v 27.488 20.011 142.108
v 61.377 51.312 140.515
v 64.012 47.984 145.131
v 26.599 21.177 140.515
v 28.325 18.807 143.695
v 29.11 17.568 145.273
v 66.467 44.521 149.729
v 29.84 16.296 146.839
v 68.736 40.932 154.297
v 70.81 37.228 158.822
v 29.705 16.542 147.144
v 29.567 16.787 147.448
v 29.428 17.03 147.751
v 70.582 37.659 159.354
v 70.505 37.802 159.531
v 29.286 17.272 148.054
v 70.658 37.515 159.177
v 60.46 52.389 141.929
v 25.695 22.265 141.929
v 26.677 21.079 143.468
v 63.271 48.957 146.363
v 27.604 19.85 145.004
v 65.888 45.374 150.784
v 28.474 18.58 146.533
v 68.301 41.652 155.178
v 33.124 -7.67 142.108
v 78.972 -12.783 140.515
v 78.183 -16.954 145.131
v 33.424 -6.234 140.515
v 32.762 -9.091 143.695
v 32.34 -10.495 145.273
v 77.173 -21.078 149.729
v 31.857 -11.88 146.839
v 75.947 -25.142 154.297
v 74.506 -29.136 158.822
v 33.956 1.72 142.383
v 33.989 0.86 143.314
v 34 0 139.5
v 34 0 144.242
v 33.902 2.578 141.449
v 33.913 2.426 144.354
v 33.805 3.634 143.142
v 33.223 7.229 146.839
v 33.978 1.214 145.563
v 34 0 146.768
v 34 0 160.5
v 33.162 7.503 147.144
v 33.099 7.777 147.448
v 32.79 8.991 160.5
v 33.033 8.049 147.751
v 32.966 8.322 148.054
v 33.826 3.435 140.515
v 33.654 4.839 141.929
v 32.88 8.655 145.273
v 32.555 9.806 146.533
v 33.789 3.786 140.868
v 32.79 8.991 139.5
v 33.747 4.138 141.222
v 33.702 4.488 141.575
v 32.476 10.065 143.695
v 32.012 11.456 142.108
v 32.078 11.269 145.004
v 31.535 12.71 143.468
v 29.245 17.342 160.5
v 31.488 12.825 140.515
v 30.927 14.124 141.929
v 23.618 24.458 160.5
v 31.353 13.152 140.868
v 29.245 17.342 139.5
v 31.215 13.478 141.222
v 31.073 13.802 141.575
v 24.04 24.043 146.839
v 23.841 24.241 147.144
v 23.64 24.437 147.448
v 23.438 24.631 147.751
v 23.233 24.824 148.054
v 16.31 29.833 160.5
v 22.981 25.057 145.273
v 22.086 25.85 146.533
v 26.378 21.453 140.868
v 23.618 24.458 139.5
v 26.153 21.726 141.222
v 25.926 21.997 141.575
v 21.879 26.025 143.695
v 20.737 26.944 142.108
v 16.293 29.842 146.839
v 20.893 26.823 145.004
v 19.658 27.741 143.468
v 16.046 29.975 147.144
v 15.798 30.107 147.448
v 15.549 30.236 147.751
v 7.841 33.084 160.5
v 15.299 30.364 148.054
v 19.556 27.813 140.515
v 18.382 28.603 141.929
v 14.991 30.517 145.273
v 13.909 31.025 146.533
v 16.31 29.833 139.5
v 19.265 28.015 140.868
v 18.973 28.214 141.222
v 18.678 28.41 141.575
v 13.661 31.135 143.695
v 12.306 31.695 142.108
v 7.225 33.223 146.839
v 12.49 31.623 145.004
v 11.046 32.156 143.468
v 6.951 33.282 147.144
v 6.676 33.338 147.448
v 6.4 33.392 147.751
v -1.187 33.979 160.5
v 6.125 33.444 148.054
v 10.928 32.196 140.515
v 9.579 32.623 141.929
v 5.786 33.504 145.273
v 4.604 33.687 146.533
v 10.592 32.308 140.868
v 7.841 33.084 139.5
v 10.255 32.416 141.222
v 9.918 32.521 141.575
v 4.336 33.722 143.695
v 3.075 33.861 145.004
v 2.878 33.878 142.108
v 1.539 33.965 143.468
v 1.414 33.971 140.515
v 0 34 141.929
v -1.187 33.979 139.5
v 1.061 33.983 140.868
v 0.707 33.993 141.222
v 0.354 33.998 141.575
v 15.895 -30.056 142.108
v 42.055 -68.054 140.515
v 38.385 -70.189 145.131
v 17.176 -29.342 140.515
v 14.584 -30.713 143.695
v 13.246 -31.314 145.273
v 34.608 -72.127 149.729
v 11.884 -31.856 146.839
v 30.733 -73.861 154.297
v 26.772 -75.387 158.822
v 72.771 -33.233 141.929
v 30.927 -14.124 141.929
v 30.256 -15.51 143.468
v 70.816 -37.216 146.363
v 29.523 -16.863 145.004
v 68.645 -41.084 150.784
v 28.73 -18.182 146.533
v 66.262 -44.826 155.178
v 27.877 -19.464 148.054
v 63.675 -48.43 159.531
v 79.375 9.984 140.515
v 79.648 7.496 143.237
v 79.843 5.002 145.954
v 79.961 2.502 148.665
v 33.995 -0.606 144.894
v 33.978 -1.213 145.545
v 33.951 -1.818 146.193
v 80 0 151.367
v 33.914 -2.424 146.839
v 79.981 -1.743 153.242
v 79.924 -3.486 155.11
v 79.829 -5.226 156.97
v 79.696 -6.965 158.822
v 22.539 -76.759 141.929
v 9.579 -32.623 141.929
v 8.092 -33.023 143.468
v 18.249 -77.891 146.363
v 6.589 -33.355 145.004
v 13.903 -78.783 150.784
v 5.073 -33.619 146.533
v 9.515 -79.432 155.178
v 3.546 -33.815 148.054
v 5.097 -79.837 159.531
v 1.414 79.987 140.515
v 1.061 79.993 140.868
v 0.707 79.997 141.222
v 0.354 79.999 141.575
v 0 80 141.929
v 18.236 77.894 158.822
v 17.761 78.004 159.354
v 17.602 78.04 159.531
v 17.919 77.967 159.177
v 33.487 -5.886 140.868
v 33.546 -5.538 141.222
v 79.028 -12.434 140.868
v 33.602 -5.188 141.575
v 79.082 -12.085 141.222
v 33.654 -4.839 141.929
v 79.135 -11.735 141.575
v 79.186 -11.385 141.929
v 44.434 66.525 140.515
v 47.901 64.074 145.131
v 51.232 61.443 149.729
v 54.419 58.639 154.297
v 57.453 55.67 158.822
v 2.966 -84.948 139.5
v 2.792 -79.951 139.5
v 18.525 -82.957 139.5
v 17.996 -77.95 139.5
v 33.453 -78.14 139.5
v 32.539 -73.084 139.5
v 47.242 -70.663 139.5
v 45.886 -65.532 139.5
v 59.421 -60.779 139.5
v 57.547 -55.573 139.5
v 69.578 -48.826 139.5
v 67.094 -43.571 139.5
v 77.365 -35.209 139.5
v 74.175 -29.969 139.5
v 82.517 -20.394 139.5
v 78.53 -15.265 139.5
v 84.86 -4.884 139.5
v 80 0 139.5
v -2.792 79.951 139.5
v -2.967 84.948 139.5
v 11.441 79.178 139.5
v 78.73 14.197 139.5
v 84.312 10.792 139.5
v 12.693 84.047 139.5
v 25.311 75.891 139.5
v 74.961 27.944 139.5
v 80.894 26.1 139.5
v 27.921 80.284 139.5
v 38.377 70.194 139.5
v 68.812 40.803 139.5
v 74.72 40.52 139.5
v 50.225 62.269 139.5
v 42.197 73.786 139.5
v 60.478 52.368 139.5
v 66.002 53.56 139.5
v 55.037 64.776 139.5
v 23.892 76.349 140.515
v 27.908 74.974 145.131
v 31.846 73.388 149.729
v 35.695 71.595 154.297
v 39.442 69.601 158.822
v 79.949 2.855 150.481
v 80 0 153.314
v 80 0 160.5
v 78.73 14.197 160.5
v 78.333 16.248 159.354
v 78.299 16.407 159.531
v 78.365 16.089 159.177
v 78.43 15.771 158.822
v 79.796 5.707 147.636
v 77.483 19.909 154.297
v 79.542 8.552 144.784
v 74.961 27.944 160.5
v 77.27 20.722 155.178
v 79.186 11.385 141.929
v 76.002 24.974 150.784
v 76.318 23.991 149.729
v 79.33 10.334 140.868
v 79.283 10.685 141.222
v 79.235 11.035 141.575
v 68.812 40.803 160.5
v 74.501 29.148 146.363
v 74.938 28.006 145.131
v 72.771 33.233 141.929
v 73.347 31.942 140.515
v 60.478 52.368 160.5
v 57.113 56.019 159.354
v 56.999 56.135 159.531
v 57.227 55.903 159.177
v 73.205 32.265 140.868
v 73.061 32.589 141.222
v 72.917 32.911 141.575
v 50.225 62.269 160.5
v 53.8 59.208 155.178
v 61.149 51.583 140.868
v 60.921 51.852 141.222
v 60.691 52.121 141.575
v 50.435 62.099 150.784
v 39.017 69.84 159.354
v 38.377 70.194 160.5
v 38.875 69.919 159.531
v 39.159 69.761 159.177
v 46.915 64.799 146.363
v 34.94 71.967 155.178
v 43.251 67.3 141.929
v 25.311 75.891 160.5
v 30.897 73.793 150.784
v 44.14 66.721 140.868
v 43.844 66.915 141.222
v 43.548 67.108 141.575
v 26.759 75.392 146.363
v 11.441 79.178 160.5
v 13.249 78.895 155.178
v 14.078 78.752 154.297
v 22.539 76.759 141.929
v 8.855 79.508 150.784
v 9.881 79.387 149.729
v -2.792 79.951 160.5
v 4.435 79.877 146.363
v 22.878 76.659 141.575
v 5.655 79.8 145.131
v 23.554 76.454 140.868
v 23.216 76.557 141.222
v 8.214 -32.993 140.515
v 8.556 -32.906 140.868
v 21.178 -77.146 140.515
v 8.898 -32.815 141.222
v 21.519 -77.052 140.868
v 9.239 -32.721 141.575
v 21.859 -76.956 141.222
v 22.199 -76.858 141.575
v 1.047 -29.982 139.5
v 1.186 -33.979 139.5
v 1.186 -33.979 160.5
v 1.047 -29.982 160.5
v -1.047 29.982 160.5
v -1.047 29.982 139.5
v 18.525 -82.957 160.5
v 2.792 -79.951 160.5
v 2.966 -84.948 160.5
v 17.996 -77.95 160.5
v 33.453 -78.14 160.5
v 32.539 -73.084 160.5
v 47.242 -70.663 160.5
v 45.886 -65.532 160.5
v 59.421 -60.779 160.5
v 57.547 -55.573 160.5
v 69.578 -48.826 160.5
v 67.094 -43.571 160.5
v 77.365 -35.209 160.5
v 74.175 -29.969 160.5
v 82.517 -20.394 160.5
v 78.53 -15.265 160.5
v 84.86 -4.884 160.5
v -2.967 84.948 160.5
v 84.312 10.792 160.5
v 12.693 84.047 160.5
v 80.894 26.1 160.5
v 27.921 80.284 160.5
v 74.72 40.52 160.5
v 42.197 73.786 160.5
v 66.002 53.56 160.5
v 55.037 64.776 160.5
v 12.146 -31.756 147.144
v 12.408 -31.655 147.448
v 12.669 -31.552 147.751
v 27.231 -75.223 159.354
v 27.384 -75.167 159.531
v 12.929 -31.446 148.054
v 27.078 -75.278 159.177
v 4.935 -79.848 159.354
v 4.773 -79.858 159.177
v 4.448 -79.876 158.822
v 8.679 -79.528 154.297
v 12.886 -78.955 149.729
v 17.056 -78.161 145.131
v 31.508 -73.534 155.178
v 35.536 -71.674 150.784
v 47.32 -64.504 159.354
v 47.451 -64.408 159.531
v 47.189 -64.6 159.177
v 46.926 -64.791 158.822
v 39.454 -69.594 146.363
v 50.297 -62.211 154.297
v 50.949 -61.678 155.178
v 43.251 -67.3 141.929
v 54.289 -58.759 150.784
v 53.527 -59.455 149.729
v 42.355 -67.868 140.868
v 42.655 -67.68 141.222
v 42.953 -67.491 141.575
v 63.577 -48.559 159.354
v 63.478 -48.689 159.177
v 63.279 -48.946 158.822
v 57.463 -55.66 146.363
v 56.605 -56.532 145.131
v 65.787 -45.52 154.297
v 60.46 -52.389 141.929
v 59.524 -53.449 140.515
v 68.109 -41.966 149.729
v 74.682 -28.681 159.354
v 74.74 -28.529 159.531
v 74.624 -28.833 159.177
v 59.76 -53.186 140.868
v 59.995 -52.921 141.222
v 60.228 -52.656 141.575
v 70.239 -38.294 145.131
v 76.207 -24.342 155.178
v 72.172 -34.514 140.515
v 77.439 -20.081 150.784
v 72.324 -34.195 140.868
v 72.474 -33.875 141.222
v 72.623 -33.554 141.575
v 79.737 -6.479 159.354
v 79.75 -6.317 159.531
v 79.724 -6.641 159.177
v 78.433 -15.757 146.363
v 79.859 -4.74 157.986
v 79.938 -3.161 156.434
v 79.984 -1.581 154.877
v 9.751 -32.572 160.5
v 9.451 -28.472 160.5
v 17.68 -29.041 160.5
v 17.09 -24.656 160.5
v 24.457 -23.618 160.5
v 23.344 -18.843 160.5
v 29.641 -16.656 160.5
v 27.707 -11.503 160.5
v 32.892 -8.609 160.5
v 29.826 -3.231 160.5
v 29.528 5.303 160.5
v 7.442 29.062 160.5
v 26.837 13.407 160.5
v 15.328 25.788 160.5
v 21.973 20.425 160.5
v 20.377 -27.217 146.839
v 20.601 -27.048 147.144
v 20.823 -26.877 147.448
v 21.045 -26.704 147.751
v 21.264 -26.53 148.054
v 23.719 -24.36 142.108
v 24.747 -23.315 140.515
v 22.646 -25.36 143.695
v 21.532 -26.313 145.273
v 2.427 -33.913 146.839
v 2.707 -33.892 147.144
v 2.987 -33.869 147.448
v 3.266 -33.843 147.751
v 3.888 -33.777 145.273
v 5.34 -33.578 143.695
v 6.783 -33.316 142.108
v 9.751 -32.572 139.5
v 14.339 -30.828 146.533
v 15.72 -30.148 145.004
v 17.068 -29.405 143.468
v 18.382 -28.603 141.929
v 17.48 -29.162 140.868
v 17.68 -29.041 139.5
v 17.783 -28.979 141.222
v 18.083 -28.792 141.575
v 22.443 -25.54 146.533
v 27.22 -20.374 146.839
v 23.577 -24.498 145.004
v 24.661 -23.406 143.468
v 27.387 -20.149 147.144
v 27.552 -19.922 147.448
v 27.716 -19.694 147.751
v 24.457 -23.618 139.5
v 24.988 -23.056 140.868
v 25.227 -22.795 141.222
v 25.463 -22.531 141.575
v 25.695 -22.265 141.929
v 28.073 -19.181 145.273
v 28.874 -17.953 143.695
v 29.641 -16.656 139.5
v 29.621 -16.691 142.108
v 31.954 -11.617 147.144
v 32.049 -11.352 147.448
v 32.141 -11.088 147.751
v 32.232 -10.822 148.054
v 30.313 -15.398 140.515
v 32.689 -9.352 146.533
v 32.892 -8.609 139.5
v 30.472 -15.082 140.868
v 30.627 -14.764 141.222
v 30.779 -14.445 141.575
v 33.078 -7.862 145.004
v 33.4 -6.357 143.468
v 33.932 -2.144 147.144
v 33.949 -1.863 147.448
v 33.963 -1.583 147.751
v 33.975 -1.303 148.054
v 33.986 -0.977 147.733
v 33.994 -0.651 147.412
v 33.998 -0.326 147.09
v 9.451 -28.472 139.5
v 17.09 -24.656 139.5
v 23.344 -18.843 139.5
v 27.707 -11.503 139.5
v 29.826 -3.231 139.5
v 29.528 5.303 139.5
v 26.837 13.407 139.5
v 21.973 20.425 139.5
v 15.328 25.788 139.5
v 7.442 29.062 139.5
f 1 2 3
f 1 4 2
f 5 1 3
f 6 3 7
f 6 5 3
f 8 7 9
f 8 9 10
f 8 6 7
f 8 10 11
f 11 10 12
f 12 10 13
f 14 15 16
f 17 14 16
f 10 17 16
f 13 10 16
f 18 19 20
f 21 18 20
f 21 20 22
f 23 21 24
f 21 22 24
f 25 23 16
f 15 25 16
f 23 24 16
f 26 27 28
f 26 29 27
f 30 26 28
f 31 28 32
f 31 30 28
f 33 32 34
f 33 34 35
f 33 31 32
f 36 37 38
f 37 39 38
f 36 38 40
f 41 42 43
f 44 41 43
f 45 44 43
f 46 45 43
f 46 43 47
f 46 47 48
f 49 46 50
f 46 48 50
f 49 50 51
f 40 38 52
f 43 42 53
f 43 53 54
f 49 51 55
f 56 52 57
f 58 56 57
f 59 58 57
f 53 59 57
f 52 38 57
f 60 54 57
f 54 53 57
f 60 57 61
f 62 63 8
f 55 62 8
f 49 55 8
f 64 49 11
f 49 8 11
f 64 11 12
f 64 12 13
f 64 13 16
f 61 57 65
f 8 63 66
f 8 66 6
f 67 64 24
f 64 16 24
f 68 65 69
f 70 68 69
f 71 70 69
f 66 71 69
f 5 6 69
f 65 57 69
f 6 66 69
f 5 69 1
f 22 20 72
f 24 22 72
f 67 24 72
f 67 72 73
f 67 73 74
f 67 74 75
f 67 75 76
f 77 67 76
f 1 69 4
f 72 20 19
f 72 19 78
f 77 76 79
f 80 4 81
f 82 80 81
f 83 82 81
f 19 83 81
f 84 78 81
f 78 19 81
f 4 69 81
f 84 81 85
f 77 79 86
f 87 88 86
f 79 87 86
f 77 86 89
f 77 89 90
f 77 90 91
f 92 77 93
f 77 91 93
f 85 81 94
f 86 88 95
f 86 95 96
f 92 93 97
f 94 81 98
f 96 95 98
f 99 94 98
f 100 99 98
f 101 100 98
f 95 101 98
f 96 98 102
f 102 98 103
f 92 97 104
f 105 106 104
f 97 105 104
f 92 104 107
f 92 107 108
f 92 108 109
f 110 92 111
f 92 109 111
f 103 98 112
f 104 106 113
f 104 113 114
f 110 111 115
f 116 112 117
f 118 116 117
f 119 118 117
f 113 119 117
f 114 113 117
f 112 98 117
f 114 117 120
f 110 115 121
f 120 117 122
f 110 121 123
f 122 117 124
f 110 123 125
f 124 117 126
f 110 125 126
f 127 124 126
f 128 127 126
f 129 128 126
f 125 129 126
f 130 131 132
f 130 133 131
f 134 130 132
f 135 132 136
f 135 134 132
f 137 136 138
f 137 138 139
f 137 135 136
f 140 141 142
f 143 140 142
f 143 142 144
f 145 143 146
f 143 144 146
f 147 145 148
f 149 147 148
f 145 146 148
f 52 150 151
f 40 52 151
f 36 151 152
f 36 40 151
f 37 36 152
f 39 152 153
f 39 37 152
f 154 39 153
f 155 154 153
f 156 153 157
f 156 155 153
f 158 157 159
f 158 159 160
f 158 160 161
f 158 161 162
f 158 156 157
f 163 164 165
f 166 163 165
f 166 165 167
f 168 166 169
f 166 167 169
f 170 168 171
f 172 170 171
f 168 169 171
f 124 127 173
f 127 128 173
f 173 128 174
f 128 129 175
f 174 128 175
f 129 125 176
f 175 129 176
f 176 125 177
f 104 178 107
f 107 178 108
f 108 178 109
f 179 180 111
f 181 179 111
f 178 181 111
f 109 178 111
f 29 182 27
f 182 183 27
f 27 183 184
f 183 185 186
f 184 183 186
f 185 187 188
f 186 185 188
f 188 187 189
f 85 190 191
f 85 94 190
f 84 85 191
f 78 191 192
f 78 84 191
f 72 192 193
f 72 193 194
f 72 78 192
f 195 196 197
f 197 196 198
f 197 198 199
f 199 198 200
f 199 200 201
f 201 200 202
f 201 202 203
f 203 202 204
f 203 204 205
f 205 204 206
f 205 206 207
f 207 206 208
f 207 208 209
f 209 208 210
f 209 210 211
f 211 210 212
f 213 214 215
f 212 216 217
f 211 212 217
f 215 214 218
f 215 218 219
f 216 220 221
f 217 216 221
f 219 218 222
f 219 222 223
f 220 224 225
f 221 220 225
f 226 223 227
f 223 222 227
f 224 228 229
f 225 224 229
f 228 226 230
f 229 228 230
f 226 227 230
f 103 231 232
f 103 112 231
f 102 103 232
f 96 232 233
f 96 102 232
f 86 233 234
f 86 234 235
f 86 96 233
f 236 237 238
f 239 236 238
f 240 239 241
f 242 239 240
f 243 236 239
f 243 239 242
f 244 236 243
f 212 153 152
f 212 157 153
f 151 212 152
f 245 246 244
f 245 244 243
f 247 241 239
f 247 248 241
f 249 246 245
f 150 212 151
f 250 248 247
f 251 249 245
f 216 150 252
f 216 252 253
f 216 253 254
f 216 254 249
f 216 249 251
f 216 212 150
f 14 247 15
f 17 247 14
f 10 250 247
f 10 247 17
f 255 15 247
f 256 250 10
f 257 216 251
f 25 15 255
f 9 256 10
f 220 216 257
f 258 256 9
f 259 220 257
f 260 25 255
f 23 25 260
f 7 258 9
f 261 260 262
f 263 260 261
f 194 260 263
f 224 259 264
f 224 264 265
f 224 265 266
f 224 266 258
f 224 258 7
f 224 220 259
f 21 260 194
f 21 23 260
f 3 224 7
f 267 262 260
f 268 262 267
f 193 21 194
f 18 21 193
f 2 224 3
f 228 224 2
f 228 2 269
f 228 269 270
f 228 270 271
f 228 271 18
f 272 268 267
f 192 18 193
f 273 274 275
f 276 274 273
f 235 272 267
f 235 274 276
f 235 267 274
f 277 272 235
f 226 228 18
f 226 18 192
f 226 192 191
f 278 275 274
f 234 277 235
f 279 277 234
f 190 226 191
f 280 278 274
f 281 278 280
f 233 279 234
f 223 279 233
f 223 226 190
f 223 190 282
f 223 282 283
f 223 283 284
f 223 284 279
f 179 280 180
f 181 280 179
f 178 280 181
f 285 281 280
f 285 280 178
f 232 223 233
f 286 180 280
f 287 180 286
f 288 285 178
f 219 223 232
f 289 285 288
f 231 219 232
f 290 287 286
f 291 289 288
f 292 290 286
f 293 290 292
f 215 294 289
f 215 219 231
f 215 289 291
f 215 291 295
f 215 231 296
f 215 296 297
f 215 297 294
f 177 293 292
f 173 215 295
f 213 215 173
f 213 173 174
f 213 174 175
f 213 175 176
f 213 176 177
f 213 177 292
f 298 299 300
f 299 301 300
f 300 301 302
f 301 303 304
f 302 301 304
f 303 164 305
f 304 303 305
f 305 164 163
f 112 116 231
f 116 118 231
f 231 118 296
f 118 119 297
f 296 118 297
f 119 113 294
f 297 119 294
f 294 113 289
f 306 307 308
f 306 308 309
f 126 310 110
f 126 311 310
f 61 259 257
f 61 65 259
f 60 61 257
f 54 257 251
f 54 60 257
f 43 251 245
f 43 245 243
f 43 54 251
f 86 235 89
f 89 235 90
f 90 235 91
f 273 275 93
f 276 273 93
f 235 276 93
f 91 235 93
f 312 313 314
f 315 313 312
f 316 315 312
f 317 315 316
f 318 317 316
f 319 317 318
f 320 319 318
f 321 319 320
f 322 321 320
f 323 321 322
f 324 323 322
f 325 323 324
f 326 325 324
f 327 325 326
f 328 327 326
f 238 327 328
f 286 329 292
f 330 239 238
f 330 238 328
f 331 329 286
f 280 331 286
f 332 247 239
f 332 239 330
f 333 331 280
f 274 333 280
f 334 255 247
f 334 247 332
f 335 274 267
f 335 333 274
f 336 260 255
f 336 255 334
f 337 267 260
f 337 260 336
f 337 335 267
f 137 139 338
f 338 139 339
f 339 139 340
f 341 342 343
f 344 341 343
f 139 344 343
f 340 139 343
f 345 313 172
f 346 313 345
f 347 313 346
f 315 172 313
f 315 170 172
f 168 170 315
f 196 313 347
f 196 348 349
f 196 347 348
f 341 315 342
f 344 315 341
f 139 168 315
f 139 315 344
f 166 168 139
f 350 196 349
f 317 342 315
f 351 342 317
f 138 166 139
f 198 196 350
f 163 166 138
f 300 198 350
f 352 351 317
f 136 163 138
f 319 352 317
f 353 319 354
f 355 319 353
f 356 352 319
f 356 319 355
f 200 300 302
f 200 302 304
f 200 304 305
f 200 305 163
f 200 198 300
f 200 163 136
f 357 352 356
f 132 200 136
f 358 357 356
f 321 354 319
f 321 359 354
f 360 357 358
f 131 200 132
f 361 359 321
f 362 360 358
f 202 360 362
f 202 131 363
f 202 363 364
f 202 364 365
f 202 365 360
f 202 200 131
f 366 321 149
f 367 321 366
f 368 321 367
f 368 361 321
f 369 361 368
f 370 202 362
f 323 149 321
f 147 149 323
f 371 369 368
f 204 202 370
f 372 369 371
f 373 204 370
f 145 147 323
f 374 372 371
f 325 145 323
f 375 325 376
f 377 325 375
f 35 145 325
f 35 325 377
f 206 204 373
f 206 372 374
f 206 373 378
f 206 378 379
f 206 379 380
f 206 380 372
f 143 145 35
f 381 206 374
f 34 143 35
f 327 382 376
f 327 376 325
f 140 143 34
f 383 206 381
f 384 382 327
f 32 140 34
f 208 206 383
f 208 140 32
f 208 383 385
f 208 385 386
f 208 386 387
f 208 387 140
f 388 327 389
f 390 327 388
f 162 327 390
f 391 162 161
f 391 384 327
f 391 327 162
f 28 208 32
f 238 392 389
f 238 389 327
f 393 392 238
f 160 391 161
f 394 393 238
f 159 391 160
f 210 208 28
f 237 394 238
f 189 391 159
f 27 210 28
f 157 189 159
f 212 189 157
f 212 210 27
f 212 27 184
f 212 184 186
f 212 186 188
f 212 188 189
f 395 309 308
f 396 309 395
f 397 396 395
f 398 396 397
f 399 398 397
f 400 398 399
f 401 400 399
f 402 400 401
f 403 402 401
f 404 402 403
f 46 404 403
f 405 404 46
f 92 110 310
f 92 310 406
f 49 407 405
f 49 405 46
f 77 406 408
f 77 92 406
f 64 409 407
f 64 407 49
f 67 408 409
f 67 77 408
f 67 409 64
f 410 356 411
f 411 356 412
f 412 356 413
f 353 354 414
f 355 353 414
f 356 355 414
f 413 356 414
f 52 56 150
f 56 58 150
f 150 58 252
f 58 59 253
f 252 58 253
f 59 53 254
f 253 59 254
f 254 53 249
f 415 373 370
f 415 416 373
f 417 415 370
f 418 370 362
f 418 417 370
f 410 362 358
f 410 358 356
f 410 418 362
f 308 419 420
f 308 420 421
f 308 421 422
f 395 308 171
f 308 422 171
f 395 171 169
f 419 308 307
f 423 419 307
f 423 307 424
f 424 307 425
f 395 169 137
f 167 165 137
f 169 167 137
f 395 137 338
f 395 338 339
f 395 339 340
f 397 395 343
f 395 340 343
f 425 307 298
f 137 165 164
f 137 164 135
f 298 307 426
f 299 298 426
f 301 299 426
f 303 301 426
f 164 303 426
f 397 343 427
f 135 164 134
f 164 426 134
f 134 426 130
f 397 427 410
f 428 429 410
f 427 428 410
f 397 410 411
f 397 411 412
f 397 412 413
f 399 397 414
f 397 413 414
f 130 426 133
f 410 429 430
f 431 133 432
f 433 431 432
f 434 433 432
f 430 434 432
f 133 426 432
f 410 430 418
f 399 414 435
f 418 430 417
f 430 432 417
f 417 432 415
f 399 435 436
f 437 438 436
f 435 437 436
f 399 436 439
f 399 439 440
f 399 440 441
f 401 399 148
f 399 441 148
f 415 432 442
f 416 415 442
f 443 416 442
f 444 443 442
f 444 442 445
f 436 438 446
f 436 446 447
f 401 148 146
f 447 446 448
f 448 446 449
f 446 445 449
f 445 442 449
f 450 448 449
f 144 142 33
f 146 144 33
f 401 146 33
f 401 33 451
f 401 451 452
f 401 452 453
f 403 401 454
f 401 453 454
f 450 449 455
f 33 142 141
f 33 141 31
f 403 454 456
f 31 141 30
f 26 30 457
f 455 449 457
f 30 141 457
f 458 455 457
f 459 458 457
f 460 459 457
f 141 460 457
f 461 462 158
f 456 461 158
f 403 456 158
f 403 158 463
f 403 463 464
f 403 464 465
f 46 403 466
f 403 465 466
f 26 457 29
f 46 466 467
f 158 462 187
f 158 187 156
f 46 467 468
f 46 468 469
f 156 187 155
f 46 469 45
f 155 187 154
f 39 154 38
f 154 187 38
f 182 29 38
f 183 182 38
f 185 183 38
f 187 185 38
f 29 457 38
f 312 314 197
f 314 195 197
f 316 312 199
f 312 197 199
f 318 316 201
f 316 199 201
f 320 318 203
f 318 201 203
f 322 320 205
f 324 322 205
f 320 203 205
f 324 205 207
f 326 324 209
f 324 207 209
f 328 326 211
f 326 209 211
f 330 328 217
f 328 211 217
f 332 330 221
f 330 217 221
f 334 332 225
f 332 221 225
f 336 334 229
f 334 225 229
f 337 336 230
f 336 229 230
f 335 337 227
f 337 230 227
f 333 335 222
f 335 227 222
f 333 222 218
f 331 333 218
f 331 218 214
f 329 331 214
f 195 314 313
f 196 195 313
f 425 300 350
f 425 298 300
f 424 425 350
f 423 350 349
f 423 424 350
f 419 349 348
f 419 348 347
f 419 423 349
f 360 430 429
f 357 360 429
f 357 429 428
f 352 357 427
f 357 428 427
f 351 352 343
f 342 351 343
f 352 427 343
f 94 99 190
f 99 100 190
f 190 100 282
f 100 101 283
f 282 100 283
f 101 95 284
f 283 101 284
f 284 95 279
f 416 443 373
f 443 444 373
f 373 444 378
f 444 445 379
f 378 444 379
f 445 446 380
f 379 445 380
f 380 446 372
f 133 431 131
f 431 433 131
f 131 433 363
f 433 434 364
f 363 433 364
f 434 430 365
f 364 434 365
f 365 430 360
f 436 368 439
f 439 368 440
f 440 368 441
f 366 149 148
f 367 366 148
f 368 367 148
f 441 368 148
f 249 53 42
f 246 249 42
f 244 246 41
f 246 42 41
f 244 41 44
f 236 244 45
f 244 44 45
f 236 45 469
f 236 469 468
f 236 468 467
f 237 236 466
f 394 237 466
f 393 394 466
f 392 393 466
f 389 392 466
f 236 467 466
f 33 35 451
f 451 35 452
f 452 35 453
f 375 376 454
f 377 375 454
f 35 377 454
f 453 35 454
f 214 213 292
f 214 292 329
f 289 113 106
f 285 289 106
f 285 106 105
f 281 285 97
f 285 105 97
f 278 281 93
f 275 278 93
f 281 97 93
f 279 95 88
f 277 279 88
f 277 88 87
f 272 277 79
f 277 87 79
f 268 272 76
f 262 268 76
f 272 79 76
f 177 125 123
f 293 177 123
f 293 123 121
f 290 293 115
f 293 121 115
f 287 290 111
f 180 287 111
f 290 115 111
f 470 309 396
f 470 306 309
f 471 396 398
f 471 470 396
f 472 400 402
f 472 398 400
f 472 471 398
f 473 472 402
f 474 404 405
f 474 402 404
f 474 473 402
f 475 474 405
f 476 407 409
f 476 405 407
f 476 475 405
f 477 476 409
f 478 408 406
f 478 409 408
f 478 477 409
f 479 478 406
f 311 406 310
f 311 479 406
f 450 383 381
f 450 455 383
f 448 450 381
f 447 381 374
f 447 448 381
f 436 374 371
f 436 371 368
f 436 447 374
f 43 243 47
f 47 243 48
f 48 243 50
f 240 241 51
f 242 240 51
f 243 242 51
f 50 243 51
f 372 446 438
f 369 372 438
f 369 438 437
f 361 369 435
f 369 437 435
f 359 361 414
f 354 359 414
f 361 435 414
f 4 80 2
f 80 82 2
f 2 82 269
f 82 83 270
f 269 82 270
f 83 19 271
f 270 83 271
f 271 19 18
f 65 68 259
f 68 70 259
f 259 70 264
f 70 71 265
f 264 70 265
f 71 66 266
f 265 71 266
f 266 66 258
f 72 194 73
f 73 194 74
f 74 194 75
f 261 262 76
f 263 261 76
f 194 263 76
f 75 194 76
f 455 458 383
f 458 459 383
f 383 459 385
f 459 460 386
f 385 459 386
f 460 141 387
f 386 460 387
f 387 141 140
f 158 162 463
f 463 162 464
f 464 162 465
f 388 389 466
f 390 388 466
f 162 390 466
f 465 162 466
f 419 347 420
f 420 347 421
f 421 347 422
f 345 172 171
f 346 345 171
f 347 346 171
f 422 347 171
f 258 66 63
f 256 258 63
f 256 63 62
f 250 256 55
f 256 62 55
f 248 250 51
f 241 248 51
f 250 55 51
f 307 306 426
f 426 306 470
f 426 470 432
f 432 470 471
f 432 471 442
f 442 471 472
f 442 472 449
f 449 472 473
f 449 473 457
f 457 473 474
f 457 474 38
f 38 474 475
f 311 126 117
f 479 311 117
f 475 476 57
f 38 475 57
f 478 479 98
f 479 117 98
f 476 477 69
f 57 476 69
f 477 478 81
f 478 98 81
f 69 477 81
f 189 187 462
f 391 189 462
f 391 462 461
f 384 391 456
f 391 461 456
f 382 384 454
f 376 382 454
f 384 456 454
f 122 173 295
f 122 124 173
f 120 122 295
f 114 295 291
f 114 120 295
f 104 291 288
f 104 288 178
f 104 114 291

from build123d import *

# Parameters (mm, degrees)
BOX_W                     = 500
BOX_H                     = 500
BOX_DEPTH                 = 500
BOX_PLACEMENT_ANGLE       = 2
TUBE019_R                 = 85
TUBE019_R_2               = 80
TUBE019_DEPTH             = 21
TUBE012_R                 = 100
TUBE012_R_2               = 80
TUBE012_DEPTH             = 200
PAD030_DEPTH              = 100
PAD031_DEPTH              = 2
COMMON013_PLACEMENT_ANGLE = 45
ARRAY013_COUNT            = 22
ARRAY013_PLACEMENT_ANGLE  = 180
TUBE020_R                 = 34
TUBE020_R_2               = 30
TUBE020_DEPTH             = 21


with BuildPart() as cube:
    # Box → Box (new body)
    with BuildSketch(Plane.XY):
        with Locations((250, 250)):
            Rectangle(BOX_W, BOX_H)
    extrude(amount=BOX_DEPTH)


with BuildPart() as cube_1:
    # Box placement: moved
    add(cube.part.moved(Location((8.73, -250, 0))).rotate(Axis((8.73, -250, 0), (0, 0, 1)), BOX_PLACEMENT_ANGLE))


with BuildPart() as tube019:
    # Tube019 → Tube019 (new body)
    with BuildSketch(Plane.XY.offset(139.5)):
        Circle(TUBE019_R)
        Circle(TUBE019_R_2, mode=Mode.SUBTRACT)
    extrude(amount=TUBE019_DEPTH)


with BuildPart() as tube012:
    # Tube012 → Tube012 (new body)
    with BuildSketch(Plane.XY):
        Circle(TUBE012_R)
        Circle(TUBE012_R_2, mode=Mode.SUBTRACT)
    extrude(amount=TUBE012_DEPTH)


with BuildPart() as body031:
    # Sketch030 → Pad030 (new body)
    with BuildSketch(Plane.XZ):
        Polygon((0, 0), (0, 2), (26, 0.9), (26, 0), align=None)
    extrude(amount=PAD030_DEPTH)


with BuildPart() as body031_1:
    # Body031 placement: moved
    add(body031.part.moved(Location((-5, 0, 5))))


with BuildPart() as cut001:
    # Sketch031 → Pad031 (new body)
    with BuildSketch(Plane.XY):
        Polygon((0, 0), (0, -52), (25.94305, -47.924315), (8.5, 0), align=None)
    extrude(amount=PAD031_DEPTH)


with BuildPart() as cut001_1:
    # Body032 placement: moved
    add(cut001.part.moved(Location((-5, -33, 5))))

    # Common013: intersect Body031
    add(body031_1.part, mode=Mode.INTERSECT)


with BuildPart() as cut001_2:
    # Common013 placement: moved
    add(cut001_1.part.rotate(Axis((0, 0, 0), (0, 1, 0)), COMMON013_PLACEMENT_ANGLE))

    # Array013: Cut001 ×22 about axis
    array013_axis = Axis((0, 0, 0), (0, 0, 1))


with BuildPart() as cut001_3:
    add(cut001_2.part)
    for i in range(1, ARRAY013_COUNT):
        add(cut001_2.part.rotate(array013_axis, i * 360 / ARRAY013_COUNT))


with BuildPart() as cut001_4:
    # Array013 placement: moved
    add(cut001_3.part.moved(Location((0, 0, 149))).rotate(Axis((0, 0, 149), (0, 1, 0)), ARRAY013_PLACEMENT_ANGLE))

    # Cut001: cut Tube012
    add(tube012.part, mode=Mode.SUBTRACT)


with BuildPart() as statorh1:
    # Tube020 → Tube020 (new body)
    with BuildSketch(Plane.XY.offset(139.5)):
        Circle(TUBE020_R)
        Circle(TUBE020_R_2, mode=Mode.SUBTRACT)
    extrude(amount=TUBE020_DEPTH)

    # Fusion009: union Tube019, Cut001
    add(tube019.part)
    add(cut001_4.part)

    # Common015: intersect Cube
    add(cube_1.part, mode=Mode.INTERSECT)


solid = statorh1.part
